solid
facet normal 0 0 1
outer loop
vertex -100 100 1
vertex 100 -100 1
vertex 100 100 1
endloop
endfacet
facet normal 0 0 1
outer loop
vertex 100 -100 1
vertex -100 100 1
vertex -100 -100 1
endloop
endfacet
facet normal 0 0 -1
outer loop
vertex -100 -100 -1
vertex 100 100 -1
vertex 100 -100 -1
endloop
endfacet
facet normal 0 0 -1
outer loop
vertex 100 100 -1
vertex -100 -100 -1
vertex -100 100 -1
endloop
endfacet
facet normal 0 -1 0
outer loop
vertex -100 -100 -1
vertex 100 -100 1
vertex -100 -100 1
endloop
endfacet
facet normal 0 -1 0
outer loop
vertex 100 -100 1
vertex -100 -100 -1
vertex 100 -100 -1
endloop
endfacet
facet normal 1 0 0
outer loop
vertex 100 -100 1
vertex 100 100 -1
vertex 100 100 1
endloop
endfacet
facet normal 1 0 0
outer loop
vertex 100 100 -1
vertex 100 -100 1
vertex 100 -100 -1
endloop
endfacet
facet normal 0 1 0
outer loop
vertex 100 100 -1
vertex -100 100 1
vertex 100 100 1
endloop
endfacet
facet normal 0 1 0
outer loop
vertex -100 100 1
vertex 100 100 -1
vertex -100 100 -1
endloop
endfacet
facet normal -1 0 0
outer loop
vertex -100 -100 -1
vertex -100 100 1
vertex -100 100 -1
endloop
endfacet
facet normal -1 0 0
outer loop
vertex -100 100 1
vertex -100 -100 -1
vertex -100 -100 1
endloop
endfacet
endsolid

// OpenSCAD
// Parameters
sheet_length = 200; //[100:400:1]
sheet_width  = 200; //[100:400:1]
sheet_thickness = 2; //[1:4:0.5]

// Robust minimum thickness to avoid "blank" renders due to near-zero Z
min_t = 1;
t = max(sheet_thickness, min_t);

// Geometry (one connected solid)
color([0.85, 0.85, 0.8])
cube([sheet_length, sheet_width, t], center=true);
